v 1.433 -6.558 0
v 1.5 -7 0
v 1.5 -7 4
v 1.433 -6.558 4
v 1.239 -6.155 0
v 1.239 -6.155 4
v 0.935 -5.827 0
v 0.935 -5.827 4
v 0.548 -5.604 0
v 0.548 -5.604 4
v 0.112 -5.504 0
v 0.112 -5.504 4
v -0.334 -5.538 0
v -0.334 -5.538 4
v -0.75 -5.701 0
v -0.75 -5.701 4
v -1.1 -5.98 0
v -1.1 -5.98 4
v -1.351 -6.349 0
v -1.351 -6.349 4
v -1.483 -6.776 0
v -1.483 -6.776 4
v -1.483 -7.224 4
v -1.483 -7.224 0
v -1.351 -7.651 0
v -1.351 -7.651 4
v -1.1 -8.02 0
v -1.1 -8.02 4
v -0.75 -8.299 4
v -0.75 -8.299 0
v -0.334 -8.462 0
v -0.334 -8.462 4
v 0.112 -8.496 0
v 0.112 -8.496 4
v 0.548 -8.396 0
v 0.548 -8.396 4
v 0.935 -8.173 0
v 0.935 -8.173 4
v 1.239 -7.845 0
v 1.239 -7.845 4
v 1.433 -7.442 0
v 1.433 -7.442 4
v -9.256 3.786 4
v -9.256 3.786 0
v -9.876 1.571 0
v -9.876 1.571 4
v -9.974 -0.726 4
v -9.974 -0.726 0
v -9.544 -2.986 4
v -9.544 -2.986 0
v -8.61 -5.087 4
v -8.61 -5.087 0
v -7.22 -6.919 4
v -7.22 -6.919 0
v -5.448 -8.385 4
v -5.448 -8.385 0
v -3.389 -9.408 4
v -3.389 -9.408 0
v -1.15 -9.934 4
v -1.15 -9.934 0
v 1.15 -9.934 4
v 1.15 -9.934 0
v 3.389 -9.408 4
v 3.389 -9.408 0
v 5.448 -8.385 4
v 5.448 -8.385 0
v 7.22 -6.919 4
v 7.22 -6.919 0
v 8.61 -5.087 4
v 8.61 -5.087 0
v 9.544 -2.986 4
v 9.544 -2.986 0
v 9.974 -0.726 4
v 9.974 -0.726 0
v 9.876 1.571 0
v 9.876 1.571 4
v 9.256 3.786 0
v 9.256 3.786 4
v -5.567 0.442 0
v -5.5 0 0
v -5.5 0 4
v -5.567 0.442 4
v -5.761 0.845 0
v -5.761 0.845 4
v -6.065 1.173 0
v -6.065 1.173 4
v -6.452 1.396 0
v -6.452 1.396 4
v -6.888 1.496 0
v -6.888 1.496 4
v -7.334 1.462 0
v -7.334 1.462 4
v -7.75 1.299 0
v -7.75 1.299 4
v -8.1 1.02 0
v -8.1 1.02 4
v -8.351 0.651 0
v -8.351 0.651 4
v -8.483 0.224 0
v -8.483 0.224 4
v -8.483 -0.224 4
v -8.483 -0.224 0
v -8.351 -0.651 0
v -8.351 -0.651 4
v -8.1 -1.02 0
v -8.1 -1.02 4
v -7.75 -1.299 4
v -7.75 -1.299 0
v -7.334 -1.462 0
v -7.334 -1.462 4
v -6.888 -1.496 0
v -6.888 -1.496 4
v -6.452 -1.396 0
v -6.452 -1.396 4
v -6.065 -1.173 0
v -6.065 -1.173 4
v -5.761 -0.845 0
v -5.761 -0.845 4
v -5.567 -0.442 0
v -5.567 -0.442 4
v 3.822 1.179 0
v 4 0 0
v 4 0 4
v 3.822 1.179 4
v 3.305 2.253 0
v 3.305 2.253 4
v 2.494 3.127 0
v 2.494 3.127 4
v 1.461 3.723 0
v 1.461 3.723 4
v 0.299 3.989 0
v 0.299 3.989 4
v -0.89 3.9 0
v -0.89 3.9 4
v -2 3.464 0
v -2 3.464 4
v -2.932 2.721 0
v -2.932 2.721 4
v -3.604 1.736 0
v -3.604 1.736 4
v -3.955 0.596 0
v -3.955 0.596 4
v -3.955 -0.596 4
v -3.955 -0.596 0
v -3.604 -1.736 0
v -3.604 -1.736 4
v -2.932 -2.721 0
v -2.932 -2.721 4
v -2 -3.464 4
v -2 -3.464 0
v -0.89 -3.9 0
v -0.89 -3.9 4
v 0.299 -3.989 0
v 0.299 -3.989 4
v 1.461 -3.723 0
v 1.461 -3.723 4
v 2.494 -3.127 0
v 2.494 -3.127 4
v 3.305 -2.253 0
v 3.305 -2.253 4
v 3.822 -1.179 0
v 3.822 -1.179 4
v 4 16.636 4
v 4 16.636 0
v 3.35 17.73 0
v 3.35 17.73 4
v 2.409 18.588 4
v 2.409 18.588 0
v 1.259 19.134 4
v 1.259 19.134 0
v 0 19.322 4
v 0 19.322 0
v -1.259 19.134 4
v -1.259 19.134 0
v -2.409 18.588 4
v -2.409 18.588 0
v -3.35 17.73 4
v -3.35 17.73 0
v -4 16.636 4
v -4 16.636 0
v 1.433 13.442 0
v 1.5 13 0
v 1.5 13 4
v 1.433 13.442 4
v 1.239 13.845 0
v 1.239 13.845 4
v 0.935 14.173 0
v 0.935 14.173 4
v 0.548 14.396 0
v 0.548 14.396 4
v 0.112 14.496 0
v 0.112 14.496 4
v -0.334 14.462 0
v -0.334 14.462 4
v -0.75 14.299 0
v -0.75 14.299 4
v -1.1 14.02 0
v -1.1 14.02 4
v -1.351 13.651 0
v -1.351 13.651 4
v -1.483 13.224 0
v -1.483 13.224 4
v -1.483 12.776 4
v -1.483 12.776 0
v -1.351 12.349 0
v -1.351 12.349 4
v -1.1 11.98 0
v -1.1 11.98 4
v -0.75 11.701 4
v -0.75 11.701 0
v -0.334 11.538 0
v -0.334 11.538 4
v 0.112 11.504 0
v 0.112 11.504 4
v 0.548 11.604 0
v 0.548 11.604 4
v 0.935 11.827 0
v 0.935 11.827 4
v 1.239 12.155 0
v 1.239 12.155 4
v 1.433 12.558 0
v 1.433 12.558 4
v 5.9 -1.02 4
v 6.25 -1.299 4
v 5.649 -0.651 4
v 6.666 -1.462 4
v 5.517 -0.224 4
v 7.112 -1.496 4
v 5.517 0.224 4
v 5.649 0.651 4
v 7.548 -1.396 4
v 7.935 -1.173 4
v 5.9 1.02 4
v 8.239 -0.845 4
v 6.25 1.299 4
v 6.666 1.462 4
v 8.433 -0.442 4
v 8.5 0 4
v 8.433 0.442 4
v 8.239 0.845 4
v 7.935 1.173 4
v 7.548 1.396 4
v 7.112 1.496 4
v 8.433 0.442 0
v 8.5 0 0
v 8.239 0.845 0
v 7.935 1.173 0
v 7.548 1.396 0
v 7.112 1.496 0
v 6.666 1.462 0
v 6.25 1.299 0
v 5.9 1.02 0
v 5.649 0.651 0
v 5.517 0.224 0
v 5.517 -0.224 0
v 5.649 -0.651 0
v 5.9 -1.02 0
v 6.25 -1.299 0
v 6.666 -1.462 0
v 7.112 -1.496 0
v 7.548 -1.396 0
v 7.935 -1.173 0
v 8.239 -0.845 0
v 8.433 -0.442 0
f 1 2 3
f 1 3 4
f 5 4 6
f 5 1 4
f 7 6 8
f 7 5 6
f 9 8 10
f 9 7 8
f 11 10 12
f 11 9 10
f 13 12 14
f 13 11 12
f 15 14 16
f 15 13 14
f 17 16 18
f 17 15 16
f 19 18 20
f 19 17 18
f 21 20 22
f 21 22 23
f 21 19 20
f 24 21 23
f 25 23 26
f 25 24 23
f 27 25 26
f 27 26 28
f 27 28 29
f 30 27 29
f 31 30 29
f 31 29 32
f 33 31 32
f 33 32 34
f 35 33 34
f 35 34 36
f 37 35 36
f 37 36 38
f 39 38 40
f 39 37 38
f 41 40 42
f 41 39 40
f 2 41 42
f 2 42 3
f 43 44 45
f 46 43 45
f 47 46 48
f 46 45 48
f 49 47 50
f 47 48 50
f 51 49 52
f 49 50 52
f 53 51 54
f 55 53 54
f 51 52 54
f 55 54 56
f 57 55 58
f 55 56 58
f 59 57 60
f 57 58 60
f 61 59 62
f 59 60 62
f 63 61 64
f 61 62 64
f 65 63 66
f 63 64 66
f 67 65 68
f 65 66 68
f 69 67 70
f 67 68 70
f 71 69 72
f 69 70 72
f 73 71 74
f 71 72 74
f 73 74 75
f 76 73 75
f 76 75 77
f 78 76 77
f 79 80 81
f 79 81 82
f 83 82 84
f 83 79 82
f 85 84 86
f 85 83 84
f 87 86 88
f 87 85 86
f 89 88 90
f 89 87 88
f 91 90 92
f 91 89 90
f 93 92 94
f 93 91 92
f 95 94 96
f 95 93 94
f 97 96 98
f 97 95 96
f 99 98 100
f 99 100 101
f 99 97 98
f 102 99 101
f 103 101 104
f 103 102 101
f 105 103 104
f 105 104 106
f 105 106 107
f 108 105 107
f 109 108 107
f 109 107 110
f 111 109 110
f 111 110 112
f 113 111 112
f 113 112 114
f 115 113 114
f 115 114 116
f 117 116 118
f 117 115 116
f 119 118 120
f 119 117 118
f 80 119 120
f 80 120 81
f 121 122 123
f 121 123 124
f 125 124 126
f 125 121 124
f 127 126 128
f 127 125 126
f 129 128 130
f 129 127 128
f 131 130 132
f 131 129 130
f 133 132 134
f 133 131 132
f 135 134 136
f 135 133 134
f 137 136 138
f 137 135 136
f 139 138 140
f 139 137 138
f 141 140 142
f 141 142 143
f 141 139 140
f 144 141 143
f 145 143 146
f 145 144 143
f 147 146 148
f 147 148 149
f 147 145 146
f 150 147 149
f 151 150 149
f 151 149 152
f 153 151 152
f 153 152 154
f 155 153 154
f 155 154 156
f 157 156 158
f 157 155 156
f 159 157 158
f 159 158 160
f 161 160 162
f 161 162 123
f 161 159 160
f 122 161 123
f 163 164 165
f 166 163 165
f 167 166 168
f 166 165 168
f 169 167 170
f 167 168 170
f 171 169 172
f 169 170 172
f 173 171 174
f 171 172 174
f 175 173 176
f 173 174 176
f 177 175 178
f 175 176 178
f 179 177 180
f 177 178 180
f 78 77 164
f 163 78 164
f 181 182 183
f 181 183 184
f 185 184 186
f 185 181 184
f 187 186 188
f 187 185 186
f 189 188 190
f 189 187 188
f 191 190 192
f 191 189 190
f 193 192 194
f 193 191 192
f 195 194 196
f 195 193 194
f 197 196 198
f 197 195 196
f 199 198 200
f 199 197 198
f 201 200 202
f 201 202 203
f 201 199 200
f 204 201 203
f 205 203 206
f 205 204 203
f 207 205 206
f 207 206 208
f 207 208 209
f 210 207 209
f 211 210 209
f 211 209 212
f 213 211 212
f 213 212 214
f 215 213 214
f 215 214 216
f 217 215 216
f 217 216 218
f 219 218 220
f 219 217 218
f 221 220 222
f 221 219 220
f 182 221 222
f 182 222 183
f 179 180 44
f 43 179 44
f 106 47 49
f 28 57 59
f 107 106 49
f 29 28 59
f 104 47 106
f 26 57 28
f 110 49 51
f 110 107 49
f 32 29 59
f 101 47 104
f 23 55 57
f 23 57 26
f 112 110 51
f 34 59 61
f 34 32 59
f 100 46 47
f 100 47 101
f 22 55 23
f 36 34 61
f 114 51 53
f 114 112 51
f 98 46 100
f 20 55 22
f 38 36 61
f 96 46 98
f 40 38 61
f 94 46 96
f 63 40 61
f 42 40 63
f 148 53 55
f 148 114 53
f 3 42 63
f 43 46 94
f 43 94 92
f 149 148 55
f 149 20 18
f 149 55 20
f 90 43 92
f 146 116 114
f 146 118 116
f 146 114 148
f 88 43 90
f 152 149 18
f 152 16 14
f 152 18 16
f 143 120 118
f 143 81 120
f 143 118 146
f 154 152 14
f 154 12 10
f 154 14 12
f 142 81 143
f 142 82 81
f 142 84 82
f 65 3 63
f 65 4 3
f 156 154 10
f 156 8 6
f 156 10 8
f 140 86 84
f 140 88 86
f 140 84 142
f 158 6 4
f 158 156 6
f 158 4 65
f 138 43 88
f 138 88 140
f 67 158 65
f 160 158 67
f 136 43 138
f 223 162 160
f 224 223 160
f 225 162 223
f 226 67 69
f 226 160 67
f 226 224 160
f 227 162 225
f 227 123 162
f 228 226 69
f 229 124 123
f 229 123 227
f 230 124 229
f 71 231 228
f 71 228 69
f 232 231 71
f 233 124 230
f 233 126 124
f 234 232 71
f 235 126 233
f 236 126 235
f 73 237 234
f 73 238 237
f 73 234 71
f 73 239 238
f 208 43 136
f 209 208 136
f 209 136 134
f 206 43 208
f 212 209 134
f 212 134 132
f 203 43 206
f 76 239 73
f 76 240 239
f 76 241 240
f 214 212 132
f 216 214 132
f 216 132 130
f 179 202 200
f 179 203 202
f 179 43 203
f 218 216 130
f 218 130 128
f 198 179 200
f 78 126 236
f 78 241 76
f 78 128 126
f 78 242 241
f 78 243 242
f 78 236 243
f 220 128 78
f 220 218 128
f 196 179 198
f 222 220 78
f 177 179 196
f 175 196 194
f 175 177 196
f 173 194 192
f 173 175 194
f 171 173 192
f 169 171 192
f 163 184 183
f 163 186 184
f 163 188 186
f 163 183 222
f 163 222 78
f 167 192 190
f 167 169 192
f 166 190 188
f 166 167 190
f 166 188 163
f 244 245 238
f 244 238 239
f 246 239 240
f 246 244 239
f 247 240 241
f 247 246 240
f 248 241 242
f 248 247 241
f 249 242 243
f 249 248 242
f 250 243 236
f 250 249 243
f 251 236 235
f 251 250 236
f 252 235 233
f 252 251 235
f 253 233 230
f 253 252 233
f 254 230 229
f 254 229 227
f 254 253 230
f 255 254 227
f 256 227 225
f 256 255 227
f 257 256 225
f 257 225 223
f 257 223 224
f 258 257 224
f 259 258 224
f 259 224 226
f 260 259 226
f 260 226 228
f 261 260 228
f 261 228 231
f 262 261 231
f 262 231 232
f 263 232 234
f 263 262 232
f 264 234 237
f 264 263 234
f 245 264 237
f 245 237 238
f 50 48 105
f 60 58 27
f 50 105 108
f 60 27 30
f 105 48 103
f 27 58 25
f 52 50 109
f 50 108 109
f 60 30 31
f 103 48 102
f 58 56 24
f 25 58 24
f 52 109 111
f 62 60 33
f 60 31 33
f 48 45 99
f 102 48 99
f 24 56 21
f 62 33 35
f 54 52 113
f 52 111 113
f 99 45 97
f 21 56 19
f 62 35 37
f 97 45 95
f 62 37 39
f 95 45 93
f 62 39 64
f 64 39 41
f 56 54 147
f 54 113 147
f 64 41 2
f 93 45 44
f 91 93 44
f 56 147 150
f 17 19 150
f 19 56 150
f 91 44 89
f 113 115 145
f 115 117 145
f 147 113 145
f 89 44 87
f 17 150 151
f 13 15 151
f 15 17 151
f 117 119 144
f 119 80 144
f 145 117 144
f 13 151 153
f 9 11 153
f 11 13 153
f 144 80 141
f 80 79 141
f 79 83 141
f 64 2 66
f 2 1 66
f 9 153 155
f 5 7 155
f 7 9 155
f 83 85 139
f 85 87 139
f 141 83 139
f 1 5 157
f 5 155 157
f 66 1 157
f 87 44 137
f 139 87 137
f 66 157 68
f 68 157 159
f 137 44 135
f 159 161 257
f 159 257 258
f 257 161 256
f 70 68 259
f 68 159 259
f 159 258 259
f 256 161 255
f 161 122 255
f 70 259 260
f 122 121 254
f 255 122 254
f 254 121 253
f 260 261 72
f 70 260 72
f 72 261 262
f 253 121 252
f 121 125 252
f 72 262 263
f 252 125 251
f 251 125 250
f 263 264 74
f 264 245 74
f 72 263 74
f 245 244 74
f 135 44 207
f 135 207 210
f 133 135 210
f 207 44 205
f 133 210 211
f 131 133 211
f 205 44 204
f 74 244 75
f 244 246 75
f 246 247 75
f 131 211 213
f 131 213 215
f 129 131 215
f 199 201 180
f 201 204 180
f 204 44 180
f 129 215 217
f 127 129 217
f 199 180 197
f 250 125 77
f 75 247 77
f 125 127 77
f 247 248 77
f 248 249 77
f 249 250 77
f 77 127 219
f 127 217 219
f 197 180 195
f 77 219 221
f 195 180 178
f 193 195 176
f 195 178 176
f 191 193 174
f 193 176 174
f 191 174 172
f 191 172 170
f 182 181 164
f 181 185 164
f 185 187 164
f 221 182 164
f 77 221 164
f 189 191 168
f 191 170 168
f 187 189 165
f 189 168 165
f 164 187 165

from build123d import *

# Parameters (mm, degrees)
SKETCH_1_R      = 1.5
SKETCH_1_R_2    = 4
EXTRUDE_1_DEPTH = 4


with BuildPart() as part:
    # 草图1 → 凸台-拉伸1 (new body)
    with BuildSketch(Plane.XY):
        with BuildLine():
            Line((-4, 16.63598728), (-9.255774721, 3.785582428))
            ThreePointArc((-9.255774721, 3.785582428), (0, -10), (9.255774721, 3.785582428))
            Line((9.255774721, 3.785582428), (4, 16.63598728))
            ThreePointArc((4, 16.63598728), (0, 19.321626358), (-4, 16.63598728))
        make_face()
        with Locations((-7, 0)):
            Circle(SKETCH_1_R, mode=Mode.SUBTRACT)
        with Locations((7, 0)):
            Circle(SKETCH_1_R, mode=Mode.SUBTRACT)
        with Locations((0, -7)):
            Circle(SKETCH_1_R, mode=Mode.SUBTRACT)
        with Locations((0, 13)):
            Circle(SKETCH_1_R, mode=Mode.SUBTRACT)
        Circle(SKETCH_1_R_2, mode=Mode.SUBTRACT)
    extrude(amount=EXTRUDE_1_DEPTH)


solid = part.part
